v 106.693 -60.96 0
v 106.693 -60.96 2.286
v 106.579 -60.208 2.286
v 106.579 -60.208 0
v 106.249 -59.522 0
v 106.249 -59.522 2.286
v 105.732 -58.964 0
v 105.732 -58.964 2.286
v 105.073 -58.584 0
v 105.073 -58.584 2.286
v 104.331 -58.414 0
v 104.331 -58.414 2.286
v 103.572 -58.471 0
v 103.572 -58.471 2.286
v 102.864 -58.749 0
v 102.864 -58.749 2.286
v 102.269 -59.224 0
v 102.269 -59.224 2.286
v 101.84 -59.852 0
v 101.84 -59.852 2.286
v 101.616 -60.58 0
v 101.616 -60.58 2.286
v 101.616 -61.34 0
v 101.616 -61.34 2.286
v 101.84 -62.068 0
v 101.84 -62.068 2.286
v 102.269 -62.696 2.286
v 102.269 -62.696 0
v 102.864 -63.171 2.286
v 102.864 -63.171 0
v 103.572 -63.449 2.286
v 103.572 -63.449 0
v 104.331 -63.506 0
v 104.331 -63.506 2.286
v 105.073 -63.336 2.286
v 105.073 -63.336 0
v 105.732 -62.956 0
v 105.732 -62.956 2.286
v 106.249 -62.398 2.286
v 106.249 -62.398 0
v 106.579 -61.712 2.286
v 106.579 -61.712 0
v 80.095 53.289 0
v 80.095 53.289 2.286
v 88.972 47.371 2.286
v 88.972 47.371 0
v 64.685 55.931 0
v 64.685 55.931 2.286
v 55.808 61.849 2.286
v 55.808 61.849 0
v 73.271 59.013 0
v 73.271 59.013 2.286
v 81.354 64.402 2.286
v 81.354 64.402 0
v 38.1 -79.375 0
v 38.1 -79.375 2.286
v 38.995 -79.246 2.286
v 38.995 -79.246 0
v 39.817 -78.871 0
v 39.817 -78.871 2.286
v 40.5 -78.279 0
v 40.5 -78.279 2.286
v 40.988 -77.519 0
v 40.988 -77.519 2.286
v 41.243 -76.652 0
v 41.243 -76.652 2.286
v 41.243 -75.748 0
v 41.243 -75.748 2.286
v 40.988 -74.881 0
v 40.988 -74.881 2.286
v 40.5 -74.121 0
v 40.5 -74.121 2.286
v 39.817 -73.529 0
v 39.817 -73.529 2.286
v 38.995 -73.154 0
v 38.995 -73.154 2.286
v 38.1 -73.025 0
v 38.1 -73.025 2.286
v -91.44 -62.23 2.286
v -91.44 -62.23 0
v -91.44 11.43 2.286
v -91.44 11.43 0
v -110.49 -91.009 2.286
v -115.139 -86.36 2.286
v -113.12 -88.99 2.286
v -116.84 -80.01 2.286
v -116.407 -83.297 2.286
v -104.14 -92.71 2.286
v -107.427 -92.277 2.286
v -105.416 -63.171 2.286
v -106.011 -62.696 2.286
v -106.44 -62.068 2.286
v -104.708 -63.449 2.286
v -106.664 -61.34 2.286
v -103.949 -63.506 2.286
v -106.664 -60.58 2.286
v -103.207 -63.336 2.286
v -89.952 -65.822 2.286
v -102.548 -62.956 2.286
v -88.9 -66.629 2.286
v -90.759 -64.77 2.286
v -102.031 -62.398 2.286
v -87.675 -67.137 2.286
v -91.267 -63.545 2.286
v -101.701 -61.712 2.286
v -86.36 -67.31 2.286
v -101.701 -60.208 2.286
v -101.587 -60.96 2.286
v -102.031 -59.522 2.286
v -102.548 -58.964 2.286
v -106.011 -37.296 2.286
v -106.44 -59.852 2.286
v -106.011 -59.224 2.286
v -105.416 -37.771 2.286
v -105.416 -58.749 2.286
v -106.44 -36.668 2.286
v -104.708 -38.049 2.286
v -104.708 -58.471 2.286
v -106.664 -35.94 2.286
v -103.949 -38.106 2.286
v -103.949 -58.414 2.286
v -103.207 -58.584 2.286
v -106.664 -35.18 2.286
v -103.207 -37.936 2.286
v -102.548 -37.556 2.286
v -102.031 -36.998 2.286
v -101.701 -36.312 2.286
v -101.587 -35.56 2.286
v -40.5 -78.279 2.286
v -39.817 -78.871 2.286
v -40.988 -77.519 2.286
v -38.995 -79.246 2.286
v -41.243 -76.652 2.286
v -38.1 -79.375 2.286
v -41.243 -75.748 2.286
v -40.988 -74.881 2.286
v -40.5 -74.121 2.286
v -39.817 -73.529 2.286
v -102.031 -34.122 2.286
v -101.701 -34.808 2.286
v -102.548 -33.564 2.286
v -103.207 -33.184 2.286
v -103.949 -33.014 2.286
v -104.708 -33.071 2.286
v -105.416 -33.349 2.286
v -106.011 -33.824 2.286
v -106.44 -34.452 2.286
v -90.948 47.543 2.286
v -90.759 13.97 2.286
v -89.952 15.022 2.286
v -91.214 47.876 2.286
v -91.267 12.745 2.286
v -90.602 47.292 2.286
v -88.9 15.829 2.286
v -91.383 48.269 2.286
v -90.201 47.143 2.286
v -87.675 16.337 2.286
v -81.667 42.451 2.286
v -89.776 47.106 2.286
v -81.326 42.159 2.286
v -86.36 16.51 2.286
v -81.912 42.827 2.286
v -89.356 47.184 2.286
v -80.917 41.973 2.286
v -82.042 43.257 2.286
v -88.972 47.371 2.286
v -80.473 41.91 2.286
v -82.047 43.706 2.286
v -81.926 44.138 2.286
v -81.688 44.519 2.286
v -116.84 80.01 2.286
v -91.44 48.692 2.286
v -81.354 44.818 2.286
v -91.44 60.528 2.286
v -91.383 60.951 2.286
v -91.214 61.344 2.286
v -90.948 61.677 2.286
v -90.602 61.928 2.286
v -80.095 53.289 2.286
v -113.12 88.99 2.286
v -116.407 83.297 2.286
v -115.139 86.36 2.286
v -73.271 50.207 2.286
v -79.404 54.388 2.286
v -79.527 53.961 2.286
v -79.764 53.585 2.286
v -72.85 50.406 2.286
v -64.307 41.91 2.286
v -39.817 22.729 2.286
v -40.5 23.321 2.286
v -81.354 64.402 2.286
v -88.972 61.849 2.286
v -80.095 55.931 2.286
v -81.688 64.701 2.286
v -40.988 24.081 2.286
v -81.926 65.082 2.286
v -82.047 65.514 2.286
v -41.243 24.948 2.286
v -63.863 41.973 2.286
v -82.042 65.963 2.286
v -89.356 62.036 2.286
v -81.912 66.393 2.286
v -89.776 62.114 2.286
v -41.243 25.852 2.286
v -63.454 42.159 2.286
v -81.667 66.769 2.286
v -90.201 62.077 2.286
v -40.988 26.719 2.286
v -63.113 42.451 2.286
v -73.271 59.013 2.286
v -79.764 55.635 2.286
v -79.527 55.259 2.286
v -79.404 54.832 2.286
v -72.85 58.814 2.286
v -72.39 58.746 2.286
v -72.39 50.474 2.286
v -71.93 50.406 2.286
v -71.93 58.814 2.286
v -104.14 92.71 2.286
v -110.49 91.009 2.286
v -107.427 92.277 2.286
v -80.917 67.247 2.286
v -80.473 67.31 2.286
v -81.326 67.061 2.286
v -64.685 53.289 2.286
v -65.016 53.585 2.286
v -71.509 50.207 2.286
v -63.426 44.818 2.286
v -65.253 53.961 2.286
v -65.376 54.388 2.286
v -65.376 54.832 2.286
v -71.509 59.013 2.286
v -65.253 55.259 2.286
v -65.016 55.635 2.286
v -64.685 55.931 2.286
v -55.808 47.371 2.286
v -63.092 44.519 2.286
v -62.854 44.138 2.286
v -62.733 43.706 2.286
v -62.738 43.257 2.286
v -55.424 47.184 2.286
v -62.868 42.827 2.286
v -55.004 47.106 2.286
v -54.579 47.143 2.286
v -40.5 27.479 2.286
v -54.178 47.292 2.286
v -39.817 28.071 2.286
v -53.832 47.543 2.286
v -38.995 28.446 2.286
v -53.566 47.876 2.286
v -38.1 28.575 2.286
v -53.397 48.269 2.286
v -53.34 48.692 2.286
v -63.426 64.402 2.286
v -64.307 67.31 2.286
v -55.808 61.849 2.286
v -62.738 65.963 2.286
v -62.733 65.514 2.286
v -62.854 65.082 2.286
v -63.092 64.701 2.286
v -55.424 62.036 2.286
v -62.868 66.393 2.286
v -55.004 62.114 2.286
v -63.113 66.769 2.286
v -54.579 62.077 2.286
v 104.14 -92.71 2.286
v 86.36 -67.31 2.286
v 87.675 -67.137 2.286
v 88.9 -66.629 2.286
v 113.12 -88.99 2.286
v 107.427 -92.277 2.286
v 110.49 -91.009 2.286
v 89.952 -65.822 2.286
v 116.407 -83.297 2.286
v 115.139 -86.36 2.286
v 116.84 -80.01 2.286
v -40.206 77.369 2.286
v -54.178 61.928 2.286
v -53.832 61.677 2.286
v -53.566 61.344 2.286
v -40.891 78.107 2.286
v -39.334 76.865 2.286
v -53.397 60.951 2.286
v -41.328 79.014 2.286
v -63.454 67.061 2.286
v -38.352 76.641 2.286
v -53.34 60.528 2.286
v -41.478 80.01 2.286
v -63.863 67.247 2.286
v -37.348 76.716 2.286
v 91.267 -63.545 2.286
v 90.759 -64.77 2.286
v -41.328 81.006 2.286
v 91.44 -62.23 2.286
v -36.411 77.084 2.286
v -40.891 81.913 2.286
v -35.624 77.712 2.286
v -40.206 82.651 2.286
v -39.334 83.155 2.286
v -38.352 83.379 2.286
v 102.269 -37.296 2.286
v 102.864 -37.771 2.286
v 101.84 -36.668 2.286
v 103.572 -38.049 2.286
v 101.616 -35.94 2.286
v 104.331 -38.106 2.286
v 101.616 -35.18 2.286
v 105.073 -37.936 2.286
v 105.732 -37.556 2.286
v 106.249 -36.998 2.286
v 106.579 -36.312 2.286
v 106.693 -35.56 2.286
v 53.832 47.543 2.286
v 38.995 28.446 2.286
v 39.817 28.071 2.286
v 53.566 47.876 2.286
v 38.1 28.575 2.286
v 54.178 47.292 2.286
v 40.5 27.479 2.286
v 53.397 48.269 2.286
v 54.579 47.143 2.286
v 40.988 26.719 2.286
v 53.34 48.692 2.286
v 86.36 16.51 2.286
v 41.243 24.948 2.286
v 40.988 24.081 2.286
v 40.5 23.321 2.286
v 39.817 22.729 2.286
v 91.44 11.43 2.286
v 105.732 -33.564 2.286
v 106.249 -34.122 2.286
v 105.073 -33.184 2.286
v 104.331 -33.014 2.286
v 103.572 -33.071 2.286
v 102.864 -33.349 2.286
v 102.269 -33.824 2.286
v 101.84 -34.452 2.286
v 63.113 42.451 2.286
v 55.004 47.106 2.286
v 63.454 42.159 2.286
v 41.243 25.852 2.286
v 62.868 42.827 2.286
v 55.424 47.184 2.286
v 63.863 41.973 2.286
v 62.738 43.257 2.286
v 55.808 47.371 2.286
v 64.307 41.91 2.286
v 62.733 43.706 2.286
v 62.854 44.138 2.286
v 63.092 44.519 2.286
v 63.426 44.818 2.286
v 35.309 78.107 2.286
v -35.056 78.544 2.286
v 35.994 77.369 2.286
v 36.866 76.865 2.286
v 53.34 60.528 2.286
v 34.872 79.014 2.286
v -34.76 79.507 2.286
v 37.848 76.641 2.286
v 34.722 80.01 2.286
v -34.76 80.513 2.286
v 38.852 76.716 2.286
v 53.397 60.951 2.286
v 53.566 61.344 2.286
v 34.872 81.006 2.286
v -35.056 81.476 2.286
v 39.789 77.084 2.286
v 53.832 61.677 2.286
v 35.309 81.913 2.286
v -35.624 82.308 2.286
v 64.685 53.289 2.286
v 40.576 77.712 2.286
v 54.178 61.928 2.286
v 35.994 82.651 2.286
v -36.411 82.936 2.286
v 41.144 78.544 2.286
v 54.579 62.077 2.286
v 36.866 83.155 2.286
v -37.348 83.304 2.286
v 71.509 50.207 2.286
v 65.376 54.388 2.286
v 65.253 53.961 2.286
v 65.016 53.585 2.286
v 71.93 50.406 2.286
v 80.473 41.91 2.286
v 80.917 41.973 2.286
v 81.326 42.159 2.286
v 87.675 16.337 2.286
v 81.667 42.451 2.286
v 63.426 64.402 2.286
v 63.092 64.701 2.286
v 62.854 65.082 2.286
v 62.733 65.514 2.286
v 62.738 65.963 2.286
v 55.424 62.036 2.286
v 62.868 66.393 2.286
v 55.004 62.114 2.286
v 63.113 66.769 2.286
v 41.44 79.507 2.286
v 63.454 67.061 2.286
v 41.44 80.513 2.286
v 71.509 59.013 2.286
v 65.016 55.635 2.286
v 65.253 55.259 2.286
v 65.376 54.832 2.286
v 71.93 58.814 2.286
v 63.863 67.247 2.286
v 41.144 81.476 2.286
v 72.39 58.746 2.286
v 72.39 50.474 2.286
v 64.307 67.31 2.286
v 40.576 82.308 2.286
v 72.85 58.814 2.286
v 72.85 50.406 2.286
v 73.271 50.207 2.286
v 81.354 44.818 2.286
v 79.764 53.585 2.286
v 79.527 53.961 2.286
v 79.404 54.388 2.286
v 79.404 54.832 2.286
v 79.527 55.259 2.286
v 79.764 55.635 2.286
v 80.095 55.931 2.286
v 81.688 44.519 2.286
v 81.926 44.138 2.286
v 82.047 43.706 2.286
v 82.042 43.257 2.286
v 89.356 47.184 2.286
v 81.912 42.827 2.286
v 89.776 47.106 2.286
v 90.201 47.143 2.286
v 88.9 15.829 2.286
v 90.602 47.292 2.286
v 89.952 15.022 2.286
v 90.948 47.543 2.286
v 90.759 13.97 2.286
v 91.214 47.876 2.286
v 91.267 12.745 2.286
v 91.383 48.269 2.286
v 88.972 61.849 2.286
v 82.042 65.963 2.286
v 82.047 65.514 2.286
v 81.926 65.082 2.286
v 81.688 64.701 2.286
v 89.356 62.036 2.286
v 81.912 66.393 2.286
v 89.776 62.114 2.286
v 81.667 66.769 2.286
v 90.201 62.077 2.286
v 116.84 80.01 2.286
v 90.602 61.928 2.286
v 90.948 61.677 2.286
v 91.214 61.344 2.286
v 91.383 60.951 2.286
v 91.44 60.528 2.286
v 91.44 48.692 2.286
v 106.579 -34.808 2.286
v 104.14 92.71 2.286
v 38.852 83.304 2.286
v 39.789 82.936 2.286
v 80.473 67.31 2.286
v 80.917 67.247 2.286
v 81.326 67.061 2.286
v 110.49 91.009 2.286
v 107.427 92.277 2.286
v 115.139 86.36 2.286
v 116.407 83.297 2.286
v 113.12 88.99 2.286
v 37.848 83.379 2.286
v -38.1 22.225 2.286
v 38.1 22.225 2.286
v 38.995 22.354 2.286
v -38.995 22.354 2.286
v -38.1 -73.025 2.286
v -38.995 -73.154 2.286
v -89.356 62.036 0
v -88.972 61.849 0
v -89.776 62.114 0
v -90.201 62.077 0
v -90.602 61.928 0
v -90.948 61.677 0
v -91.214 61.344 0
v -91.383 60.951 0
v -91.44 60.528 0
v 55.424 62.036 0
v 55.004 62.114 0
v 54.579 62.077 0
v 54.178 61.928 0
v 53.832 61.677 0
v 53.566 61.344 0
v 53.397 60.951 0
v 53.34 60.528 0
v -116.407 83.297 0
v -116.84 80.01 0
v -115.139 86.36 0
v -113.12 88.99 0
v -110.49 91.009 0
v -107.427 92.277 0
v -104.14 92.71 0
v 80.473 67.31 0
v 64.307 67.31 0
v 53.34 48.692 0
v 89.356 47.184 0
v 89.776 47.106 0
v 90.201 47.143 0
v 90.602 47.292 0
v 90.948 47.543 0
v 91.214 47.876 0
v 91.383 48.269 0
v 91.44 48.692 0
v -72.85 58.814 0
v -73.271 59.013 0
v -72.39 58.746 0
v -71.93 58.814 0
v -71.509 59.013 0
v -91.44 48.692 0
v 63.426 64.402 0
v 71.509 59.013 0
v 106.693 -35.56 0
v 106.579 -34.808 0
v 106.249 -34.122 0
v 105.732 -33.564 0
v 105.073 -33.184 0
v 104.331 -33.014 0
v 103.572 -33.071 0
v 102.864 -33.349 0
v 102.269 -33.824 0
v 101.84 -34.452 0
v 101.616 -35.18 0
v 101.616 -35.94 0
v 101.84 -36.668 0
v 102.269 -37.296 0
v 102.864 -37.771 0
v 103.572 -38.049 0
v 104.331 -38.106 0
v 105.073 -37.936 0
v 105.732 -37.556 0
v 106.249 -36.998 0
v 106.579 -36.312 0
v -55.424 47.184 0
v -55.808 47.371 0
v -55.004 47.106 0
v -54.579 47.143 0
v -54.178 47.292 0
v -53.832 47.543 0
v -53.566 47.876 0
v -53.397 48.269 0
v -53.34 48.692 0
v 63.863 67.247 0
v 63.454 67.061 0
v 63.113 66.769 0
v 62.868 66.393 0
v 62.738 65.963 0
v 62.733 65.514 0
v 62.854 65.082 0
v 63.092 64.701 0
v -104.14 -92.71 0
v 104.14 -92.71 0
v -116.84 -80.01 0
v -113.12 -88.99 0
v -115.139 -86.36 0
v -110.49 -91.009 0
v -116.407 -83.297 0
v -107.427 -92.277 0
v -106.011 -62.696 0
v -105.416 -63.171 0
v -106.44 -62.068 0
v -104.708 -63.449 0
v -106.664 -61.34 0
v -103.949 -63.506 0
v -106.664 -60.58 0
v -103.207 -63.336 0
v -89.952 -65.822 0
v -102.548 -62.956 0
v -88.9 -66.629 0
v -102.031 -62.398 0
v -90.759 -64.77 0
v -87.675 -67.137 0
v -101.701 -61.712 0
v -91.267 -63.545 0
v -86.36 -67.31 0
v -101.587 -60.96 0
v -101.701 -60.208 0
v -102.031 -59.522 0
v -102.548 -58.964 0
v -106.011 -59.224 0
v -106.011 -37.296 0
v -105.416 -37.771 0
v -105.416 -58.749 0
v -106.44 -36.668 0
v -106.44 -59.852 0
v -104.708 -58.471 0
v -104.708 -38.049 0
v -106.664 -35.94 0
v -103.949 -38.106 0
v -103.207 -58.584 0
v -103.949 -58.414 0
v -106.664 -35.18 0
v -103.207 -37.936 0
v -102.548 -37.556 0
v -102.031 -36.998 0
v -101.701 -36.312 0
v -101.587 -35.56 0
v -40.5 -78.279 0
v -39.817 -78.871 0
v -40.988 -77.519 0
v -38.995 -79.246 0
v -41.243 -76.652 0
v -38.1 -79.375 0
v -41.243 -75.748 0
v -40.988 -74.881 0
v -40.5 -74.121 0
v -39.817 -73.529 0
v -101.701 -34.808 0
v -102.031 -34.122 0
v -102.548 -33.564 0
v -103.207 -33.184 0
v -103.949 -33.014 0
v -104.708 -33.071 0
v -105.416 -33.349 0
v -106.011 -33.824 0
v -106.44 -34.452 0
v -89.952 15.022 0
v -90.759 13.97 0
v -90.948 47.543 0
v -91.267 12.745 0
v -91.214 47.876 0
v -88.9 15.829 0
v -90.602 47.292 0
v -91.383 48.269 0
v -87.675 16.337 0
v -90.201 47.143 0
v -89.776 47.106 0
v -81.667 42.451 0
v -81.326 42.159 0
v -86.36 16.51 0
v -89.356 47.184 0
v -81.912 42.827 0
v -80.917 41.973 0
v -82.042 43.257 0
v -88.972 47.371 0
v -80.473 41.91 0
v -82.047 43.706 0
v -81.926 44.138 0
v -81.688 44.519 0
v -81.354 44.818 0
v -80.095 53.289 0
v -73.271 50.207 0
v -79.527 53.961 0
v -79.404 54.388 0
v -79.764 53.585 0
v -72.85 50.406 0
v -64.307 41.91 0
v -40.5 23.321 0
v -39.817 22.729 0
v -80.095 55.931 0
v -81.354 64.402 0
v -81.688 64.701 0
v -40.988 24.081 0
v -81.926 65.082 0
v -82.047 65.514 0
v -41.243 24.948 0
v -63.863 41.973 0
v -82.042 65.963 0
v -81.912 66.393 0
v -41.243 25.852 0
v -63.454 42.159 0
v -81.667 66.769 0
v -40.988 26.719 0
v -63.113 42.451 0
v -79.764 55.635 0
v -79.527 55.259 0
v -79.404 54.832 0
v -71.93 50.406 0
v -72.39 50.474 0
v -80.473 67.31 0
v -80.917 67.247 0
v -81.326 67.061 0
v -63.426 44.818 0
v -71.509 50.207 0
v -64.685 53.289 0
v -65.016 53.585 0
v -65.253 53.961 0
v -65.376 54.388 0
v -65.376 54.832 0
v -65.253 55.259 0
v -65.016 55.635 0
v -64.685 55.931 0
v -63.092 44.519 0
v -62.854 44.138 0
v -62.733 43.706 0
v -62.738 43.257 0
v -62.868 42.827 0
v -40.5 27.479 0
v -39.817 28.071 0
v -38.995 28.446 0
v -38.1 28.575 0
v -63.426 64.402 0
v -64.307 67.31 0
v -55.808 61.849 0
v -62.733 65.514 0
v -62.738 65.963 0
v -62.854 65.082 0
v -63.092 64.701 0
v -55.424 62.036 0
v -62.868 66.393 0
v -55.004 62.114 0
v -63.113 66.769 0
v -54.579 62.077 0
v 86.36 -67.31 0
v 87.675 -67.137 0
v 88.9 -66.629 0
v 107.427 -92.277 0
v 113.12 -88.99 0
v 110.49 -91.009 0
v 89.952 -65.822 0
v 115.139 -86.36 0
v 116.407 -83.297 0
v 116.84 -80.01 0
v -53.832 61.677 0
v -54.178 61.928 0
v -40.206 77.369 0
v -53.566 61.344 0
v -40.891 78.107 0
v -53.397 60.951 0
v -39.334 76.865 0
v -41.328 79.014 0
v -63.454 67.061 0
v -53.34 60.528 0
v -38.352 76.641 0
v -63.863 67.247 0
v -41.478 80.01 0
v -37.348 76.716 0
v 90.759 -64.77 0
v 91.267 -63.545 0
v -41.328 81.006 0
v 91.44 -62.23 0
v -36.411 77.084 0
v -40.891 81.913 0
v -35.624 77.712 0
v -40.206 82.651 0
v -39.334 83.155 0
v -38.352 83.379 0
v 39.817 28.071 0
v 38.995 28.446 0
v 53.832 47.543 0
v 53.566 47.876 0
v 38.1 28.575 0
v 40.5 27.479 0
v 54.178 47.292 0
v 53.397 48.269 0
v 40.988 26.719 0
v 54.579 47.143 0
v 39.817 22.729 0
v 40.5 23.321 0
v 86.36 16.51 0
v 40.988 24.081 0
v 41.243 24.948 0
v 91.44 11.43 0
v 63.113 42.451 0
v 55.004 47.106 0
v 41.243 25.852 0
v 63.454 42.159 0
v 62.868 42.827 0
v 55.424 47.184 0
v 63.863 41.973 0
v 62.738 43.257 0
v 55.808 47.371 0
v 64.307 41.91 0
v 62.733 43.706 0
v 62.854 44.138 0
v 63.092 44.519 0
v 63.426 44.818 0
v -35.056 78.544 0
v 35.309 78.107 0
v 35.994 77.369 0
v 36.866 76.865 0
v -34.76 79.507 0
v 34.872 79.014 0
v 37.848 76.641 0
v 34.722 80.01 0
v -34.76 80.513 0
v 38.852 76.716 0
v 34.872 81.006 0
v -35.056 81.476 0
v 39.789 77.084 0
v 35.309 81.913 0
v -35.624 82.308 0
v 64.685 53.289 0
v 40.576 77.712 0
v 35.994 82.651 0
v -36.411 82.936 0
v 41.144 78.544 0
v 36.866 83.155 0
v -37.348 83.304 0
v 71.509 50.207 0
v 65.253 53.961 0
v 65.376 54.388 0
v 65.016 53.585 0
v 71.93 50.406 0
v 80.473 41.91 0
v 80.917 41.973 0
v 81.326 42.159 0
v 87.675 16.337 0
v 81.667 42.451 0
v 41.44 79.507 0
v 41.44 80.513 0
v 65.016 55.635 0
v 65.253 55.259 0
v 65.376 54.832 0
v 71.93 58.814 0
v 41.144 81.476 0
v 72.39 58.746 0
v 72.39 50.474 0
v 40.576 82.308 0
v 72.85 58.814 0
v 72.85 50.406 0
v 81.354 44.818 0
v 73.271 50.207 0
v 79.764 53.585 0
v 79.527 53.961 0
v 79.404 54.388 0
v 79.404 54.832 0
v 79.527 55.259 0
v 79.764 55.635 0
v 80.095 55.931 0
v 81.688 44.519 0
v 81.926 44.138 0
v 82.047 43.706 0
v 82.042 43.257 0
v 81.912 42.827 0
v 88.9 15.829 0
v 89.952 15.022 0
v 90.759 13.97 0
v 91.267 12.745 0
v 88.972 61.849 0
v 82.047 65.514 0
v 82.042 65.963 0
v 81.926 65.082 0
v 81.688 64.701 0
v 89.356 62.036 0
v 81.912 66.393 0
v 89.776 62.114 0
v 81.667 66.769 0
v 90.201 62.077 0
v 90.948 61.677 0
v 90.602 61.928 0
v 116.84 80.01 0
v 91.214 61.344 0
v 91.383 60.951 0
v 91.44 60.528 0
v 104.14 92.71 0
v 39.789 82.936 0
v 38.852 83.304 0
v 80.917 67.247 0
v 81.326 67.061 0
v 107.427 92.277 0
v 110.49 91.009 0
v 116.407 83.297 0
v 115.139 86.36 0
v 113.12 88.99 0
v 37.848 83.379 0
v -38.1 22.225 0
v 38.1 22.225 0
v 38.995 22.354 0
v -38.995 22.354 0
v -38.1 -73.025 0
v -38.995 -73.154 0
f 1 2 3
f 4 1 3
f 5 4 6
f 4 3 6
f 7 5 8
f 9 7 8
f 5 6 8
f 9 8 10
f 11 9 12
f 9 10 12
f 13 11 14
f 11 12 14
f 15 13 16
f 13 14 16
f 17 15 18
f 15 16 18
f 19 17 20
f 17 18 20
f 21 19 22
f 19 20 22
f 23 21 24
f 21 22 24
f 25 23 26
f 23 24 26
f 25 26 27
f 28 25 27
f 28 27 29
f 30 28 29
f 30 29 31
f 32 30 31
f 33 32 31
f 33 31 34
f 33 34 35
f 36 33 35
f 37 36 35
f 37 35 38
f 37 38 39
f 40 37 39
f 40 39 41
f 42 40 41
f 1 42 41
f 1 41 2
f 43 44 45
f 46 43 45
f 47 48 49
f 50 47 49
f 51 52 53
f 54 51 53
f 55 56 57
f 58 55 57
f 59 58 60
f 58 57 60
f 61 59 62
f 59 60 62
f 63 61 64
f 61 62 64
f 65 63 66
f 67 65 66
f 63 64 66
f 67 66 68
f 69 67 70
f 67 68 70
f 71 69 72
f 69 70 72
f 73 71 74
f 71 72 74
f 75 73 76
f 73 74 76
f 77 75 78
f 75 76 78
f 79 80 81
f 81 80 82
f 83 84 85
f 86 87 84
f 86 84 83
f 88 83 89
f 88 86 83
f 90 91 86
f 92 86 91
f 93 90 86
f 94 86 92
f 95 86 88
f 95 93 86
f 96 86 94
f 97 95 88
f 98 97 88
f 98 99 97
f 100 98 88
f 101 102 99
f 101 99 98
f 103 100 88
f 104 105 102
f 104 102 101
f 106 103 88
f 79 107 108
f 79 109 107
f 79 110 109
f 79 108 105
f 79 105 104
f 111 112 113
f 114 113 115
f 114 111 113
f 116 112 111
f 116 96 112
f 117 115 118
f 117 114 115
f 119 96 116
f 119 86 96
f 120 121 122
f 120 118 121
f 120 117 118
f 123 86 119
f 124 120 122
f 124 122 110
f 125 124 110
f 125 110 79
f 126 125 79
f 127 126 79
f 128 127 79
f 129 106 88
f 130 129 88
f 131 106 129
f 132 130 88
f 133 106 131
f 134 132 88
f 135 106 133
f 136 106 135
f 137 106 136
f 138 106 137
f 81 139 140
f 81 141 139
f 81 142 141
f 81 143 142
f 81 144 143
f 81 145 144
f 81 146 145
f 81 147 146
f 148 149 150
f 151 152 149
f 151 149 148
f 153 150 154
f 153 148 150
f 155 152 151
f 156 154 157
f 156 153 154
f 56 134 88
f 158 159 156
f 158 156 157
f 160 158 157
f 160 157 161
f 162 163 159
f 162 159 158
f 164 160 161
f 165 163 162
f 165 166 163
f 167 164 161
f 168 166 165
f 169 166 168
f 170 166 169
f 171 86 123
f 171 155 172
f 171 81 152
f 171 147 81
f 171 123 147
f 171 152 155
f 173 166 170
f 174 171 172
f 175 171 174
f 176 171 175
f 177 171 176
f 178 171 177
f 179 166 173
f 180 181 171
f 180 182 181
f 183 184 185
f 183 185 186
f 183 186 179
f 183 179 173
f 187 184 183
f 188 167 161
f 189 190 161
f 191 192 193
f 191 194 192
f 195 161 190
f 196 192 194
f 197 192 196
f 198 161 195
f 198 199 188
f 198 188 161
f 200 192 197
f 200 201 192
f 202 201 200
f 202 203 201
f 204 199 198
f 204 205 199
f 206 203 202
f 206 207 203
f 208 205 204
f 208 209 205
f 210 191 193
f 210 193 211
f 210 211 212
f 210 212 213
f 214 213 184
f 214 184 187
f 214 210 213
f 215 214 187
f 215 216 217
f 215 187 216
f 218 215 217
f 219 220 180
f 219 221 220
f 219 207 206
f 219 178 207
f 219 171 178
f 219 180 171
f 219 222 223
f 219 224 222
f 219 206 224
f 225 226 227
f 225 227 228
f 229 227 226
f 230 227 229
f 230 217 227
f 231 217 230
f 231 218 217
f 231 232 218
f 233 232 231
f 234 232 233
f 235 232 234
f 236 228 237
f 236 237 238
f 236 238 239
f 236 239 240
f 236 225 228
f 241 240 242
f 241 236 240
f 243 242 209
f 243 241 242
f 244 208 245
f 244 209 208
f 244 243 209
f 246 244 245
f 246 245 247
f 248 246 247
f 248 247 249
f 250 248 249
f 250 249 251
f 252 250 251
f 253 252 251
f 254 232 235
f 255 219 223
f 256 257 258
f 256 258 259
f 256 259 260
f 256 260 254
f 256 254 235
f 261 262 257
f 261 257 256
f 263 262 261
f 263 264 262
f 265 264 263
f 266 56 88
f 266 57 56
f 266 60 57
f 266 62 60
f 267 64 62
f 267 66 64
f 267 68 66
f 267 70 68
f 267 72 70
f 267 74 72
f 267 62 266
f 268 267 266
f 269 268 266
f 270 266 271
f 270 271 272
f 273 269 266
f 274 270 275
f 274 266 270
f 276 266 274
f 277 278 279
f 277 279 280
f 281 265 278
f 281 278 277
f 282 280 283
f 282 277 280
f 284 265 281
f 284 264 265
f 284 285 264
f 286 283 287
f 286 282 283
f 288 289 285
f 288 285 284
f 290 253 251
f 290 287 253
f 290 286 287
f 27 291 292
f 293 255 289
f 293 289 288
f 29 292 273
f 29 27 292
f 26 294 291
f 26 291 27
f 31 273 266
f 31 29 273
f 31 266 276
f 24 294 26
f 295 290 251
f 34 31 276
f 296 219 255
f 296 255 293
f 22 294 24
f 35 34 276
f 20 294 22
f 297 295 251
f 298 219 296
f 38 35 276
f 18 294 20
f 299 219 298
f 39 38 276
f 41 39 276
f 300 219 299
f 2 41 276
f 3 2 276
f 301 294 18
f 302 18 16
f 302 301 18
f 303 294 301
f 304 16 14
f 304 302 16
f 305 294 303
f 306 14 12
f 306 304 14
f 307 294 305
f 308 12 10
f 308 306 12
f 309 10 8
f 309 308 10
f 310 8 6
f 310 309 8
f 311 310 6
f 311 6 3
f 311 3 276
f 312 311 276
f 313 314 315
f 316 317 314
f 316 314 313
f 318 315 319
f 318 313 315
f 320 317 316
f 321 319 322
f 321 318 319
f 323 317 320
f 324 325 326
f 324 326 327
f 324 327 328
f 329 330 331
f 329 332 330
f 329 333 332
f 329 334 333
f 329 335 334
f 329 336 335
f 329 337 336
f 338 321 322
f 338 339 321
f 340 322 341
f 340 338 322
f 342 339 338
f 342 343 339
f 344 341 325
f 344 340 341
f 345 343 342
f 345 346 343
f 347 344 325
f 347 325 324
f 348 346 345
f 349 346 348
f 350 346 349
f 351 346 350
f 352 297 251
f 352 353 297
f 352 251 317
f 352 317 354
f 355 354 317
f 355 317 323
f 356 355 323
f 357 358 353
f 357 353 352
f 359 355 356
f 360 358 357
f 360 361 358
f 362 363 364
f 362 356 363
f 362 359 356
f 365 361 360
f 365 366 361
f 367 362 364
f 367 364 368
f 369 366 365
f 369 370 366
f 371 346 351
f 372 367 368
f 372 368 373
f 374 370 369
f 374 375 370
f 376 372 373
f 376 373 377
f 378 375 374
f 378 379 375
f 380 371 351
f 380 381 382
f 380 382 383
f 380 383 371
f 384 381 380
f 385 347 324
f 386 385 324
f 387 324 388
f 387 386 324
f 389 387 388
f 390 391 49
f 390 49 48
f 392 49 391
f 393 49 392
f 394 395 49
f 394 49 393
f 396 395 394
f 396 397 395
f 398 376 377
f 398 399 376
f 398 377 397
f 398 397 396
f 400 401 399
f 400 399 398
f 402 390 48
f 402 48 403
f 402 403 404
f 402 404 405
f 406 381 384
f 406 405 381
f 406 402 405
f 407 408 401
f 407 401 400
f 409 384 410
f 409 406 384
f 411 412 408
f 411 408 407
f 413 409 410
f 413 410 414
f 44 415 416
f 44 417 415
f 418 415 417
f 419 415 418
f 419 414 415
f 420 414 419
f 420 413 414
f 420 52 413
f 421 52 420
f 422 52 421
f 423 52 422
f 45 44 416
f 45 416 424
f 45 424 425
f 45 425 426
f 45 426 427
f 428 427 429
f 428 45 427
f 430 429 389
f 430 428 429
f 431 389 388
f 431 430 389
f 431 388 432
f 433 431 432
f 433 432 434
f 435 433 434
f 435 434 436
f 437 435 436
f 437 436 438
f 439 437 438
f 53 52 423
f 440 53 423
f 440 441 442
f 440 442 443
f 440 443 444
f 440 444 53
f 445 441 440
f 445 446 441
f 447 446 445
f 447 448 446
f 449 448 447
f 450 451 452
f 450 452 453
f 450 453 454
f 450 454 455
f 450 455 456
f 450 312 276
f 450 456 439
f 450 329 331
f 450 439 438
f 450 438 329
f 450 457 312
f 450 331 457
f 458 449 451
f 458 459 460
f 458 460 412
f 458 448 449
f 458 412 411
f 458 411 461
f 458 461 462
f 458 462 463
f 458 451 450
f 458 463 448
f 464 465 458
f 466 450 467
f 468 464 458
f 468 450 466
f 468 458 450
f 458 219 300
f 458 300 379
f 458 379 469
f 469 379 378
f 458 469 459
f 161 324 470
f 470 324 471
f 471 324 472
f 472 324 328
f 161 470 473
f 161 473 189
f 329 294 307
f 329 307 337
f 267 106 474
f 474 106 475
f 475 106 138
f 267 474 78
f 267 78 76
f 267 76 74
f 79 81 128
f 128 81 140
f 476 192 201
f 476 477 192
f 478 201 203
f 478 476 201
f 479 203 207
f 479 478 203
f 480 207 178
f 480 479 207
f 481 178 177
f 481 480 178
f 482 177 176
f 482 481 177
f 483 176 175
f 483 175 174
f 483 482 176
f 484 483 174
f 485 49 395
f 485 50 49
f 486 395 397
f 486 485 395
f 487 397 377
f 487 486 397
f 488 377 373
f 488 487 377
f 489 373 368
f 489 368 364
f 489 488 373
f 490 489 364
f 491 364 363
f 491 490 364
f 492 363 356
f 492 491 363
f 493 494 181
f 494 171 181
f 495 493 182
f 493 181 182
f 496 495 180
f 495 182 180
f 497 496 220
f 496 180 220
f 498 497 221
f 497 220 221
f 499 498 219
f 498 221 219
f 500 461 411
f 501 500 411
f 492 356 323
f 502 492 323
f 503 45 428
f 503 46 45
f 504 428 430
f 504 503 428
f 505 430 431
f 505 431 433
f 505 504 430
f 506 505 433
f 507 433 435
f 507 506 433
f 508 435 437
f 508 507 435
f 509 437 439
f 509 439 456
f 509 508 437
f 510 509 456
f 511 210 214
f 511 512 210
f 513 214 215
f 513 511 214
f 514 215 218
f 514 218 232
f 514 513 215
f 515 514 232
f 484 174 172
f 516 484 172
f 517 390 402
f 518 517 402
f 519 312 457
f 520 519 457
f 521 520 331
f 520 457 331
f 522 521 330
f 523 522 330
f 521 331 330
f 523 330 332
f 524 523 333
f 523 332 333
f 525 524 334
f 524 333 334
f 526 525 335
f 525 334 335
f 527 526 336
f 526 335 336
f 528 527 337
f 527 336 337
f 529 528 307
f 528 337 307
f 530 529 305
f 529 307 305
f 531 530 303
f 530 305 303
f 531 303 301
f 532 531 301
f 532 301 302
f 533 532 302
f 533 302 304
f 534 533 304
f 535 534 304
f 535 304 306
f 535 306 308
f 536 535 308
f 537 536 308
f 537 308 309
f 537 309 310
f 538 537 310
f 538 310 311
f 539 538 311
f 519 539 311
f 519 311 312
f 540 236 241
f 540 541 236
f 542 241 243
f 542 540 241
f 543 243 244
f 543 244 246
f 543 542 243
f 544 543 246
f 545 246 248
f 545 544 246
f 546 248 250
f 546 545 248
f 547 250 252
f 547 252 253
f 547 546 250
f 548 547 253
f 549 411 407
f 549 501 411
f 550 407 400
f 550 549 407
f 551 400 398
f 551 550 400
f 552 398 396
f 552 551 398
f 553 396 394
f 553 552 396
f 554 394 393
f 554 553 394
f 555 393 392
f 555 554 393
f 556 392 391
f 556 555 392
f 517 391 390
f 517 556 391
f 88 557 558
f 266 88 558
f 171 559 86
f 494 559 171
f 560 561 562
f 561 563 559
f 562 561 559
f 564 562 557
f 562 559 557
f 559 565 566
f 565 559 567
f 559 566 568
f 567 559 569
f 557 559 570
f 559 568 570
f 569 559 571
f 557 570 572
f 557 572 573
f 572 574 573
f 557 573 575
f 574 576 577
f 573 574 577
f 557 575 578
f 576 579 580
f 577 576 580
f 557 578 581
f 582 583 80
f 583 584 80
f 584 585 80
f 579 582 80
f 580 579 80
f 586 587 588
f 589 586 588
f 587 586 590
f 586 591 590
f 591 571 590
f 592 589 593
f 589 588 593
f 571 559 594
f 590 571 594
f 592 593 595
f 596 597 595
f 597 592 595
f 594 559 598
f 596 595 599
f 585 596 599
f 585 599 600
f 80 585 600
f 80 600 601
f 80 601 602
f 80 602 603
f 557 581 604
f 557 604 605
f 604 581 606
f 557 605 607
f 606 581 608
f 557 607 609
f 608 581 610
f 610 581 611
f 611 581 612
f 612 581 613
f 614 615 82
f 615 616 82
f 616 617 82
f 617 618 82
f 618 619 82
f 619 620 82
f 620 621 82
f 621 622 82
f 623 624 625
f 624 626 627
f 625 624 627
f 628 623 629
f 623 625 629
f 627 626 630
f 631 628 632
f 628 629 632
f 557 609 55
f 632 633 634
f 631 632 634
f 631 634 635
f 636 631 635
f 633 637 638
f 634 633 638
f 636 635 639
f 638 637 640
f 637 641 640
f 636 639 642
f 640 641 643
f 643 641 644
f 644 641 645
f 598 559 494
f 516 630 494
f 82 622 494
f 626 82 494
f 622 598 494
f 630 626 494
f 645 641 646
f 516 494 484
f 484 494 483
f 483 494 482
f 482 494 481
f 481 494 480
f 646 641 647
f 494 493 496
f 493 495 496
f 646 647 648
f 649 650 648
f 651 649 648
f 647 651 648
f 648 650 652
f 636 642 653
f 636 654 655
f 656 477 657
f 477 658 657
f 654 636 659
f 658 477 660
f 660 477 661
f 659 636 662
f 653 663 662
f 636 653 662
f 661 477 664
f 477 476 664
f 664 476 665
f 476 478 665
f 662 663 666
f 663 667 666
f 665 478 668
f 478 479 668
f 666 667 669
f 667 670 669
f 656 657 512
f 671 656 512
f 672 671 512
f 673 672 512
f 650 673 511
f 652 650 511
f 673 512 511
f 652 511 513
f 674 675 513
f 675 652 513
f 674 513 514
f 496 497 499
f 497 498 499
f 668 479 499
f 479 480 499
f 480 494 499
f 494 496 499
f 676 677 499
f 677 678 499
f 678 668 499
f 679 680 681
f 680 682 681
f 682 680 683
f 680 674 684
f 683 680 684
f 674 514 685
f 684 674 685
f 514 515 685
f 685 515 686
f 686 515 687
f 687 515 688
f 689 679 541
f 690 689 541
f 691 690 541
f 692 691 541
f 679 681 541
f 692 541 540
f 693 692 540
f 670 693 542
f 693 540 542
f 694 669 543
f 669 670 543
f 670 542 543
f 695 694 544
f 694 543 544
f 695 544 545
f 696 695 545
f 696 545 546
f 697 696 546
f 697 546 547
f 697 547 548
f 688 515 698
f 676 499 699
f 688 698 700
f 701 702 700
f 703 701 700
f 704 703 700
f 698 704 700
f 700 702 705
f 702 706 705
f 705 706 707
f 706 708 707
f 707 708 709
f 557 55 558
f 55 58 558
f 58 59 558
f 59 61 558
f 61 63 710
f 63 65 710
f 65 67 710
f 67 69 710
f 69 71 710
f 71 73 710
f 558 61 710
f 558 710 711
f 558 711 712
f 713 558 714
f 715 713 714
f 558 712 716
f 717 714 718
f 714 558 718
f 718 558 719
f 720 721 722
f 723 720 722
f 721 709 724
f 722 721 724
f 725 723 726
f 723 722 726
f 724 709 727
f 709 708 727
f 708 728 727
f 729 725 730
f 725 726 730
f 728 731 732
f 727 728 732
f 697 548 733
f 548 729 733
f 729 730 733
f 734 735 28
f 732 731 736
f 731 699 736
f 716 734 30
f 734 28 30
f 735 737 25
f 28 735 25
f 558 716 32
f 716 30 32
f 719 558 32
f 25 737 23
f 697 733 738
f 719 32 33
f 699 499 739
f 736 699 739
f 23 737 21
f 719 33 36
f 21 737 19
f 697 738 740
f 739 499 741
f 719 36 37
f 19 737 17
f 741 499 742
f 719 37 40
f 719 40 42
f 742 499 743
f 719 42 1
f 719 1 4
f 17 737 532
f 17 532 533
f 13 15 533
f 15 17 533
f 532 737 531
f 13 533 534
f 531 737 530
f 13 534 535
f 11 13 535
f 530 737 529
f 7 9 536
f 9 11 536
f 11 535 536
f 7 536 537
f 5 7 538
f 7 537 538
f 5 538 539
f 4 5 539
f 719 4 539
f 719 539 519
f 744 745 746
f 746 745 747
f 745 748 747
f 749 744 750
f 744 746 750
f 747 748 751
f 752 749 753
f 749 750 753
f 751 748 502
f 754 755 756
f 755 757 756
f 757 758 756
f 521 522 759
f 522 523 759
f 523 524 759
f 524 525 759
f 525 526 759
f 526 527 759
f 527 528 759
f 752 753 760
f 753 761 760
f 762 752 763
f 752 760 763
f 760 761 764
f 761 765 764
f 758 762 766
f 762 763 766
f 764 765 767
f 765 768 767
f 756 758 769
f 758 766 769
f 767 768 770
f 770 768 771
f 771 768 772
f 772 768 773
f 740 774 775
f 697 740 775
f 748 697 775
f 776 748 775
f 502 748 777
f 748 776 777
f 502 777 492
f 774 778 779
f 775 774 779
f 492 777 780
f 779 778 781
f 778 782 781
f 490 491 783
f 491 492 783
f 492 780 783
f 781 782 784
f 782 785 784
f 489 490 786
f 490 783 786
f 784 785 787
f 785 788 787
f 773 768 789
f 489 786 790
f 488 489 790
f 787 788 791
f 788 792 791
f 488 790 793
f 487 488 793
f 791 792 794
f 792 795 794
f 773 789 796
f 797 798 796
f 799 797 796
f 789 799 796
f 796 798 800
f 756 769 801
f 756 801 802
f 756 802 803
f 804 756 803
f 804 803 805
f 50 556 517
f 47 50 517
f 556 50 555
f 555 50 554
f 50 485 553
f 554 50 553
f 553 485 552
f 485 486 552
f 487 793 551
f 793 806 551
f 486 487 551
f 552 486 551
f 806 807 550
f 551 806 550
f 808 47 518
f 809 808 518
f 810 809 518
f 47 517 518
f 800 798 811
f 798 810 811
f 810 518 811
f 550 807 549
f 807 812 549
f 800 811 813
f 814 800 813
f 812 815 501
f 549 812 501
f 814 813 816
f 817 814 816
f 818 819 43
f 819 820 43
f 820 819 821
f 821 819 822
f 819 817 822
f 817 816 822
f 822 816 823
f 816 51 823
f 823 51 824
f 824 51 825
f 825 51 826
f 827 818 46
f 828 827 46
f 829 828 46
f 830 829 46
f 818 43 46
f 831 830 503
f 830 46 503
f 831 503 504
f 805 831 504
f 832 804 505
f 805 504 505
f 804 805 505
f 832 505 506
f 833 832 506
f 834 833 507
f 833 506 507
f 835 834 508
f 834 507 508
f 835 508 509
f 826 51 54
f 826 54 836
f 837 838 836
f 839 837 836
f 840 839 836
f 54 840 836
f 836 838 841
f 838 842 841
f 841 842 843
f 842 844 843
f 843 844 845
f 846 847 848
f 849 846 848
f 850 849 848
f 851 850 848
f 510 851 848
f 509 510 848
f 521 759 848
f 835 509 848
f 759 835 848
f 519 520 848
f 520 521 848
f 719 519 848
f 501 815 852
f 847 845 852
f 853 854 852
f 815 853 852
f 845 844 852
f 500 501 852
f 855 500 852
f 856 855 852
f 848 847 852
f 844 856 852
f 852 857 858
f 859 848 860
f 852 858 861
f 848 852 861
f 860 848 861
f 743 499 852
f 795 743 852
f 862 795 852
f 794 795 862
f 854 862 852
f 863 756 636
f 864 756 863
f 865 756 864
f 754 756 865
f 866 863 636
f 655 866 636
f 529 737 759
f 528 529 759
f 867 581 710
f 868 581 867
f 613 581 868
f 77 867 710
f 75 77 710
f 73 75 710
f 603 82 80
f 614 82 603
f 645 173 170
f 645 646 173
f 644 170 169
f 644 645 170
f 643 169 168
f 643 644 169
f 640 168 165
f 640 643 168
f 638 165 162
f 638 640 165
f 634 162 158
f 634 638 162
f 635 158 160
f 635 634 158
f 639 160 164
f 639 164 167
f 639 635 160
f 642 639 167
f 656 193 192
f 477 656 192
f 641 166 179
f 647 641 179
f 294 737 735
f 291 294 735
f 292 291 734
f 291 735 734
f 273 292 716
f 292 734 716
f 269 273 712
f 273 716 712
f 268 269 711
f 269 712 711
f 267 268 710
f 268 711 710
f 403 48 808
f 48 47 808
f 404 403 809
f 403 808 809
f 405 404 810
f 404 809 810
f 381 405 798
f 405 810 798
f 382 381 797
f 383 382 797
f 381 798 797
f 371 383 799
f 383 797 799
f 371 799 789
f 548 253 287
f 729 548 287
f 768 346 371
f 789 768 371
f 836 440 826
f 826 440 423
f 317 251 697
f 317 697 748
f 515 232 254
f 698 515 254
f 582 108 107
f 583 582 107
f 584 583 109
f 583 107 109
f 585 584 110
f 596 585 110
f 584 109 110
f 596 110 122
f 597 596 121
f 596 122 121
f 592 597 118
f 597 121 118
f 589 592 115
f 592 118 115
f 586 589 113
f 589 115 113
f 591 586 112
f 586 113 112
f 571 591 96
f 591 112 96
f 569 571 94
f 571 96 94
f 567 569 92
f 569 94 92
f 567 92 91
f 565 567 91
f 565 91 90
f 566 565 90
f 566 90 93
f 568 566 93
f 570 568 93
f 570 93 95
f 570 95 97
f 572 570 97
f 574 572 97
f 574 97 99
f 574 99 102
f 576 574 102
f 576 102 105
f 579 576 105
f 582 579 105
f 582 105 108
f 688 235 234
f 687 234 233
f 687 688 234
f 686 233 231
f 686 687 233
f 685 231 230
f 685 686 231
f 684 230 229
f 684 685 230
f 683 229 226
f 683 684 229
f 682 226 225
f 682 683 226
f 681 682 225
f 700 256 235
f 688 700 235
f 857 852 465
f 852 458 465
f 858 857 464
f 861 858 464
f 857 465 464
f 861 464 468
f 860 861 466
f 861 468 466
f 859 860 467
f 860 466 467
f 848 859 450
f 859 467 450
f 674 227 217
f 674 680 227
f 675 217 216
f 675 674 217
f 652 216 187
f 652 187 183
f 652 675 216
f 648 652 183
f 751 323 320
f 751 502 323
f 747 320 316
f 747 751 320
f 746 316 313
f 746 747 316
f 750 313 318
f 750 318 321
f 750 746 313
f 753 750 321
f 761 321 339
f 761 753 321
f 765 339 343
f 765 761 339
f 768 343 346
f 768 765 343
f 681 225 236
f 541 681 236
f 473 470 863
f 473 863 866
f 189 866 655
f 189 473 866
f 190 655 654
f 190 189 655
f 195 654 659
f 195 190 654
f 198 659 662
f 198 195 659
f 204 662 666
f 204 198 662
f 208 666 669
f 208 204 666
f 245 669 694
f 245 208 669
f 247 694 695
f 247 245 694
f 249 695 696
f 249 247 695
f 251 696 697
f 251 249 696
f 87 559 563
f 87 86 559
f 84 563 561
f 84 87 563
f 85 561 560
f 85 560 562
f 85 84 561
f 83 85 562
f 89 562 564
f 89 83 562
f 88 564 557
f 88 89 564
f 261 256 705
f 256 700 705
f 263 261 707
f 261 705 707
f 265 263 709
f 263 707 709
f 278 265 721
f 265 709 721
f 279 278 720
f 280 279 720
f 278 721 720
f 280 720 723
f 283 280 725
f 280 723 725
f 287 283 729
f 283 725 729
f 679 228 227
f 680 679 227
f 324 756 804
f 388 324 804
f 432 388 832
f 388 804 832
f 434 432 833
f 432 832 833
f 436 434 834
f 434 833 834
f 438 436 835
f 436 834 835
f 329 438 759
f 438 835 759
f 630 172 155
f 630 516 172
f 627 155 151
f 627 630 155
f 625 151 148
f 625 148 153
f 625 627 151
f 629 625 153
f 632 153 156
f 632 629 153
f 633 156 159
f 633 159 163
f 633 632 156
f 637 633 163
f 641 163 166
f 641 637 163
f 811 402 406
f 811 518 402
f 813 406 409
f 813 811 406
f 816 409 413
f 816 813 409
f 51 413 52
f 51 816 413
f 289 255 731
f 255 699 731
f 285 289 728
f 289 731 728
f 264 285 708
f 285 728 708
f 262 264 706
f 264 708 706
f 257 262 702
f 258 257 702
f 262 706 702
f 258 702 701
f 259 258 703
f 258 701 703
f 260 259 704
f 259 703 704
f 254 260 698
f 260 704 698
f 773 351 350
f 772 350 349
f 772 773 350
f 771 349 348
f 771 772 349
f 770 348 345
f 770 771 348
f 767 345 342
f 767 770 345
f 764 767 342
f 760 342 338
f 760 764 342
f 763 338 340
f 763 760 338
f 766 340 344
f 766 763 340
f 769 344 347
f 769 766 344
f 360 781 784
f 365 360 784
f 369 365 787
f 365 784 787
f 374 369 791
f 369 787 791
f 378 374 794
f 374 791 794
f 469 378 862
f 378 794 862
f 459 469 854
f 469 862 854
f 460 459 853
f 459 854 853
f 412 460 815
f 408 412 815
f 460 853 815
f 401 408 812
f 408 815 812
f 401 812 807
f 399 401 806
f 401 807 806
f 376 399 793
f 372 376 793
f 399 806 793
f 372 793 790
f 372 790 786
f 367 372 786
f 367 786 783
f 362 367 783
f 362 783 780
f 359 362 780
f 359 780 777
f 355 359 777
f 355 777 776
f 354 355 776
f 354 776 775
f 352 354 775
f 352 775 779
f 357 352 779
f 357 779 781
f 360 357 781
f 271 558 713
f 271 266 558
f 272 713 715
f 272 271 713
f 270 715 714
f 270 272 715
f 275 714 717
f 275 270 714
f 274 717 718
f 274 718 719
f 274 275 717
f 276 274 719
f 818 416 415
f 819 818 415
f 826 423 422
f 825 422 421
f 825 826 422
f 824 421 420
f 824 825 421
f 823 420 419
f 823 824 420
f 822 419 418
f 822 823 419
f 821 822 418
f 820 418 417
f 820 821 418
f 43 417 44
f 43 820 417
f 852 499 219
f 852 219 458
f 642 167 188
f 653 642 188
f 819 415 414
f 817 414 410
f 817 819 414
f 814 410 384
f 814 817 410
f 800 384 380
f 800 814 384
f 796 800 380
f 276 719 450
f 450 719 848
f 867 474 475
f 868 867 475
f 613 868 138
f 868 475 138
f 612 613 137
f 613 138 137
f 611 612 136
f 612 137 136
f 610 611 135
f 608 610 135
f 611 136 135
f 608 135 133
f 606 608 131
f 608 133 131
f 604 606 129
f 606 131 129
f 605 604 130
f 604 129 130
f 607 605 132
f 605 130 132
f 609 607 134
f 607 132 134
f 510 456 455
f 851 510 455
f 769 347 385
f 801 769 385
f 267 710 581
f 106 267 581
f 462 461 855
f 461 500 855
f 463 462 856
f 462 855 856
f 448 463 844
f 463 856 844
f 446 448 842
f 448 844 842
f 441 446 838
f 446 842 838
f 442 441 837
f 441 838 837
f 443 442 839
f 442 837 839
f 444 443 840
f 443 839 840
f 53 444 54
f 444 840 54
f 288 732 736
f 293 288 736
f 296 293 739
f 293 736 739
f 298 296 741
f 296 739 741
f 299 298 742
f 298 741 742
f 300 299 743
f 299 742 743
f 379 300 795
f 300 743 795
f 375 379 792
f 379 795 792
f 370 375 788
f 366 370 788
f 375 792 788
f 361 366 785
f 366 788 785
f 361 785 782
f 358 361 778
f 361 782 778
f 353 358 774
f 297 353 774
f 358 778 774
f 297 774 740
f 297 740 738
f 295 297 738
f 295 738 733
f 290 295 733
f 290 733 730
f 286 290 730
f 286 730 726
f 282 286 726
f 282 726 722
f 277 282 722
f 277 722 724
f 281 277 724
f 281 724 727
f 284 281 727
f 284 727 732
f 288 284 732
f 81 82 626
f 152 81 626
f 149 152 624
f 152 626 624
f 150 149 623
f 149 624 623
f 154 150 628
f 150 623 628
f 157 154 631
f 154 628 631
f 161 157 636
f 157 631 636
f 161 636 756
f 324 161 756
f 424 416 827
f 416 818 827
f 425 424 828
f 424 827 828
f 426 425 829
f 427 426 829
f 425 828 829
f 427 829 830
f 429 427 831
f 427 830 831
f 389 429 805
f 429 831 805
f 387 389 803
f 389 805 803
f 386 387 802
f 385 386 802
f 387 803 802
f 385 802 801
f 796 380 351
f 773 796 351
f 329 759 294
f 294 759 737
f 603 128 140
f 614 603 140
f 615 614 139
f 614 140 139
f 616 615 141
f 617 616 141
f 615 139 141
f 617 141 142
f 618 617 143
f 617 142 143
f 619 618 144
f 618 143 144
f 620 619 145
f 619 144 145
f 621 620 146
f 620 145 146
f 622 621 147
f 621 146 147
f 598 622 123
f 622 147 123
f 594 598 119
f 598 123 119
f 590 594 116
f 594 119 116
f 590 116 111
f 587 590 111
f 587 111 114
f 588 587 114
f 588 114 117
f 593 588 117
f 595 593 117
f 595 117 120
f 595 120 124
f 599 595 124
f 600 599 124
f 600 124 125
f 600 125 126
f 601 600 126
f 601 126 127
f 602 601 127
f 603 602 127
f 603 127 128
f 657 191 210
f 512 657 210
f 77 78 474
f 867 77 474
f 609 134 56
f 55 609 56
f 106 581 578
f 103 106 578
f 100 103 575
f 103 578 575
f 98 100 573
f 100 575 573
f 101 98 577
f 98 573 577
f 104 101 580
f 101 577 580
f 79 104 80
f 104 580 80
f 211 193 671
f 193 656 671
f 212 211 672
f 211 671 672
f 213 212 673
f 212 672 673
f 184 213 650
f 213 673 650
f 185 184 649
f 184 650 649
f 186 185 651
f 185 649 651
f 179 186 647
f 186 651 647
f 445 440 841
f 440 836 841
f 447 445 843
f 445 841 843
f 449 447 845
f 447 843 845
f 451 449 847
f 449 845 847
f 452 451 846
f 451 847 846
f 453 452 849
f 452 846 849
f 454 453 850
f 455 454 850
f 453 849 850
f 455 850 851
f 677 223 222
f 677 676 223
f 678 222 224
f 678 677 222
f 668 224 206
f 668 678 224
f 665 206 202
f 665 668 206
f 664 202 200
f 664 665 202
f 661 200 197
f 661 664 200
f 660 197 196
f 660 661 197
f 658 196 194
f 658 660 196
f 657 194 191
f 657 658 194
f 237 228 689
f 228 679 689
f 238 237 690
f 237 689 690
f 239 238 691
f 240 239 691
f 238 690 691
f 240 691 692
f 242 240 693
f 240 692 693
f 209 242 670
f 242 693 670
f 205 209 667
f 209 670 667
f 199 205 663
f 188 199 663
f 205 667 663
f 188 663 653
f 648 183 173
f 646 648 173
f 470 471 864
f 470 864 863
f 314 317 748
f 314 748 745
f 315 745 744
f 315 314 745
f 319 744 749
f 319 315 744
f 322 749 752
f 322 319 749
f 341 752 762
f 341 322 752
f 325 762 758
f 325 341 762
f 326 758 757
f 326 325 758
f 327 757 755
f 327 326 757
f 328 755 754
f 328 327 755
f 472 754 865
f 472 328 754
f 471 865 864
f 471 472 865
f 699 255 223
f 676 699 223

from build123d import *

# Parameters (mm, degrees)
SKETCH1_W               = 233.68
SKETCH1_H               = 185.42
BOSS_EXTRUDE1_DEPTH     = 2.286
CUT_EXTRUDE1_DEPTH      = 150.170893595
F_1_4_CLEARANCE_HOLE2_D = 6.7564
FILLET1_R               = 12.7
SKETCH9_R               = 2.5527
CUT_EXTRUDE2_DEPTH      = 150.170893595
CUT_EXTRUDE3_DEPTH      = 150.170893595
FILLET2_R               = 1.5875


with BuildPart() as part:
    # Sketch1 → Boss-Extrude1 (new body)
    with BuildSketch(Plane.XY):
        Rectangle(SKETCH1_W, SKETCH1_H)
        with BuildLine():
            Line((-86.36, 16.51), (86.36, 16.51))
            ThreePointArc((86.36, 16.51), (89.952102448, 15.022102448), (91.44, 11.43))
            Line((91.44, 11.43), (91.44, -62.23))
            ThreePointArc((91.44, -62.23), (89.952102448, -65.822102448), (86.36, -67.31))
            Line((86.36, -67.31), (-86.36, -67.31))
            ThreePointArc((-86.36, -67.31), (-89.952102448, -65.822102448), (-91.44, -62.23))
            Line((-91.44, -62.23), (-91.44, 11.43))
            ThreePointArc((-91.44, 11.43), (-89.952102448, 15.022102448), (-86.36, 16.51))
        make_face(mode=Mode.SUBTRACT)
    extrude(amount=BOSS_EXTRUDE1_DEPTH)

    # Sketch2 → Cut-Extrude1 (cut, through all)
    with BuildSketch(Plane.XY.offset(2.286)):
        with BuildLine():
            Line((38.1, 22.225), (-38.1, 22.225))
            ThreePointArc((-38.1, 22.225), (-41.275, 25.4), (-38.1, 28.575))
            Line((-38.1, 28.575), (38.1, 28.575))
            ThreePointArc((38.1, 28.575), (41.275, 25.4), (38.1, 22.225))
        make_face()
        with BuildLine():
            Line((38.1, -73.025), (-38.1, -73.025))
            ThreePointArc((-38.1, -73.025), (-41.275, -76.2), (-38.1, -79.375))
            Line((-38.1, -79.375), (38.1, -79.375))
            ThreePointArc((38.1, -79.375), (41.275, -76.2), (38.1, -73.025))
        make_face()
    extrude(amount=-CUT_EXTRUDE1_DEPTH, mode=Mode.SUBTRACT)

    # 1/4 Clearance Hole2 (through all)
    with Locations(Plane.XY.offset(2.286)):
        with Locations((-38.1, 80.01), (38.1, 80.01)):
            Hole(F_1_4_CLEARANCE_HOLE2_D / 2)

    # Fillet1
    fillet1_edges = [part.edges().sort_by_distance(p)[0] for p in [
        (116.84, -92.71, 1.143),
        (-116.84, -92.71, 1.143),
        (-116.84, 92.71, 1.143),
        (116.84, 92.71, 1.143),
    ]]
    fillet(fillet1_edges, radius=FILLET1_R)

    # Sketch9 → Cut-Extrude2 (cut, through all)
    with BuildSketch(Plane.XY.offset(2.286)):
        with Locations((-104.14, -60.96)):
            Circle(SKETCH9_R)
        with Locations((104.14, -60.96)):
            Circle(SKETCH9_R)
        with Locations((104.14, -35.56)):
            Circle(SKETCH9_R)
        with Locations((-104.14, -35.56)):
            Circle(SKETCH9_R)
    extrude(amount=-CUT_EXTRUDE2_DEPTH, mode=Mode.SUBTRACT)

    # Sketch10 → Cut-Extrude3 (cut, through all)
    with BuildSketch(Plane.XY.offset(2.286)):
        Polygon((-59.06381265, 67.31), (-85.71618735, 67.31), (-72.39, 58.4258751), align=None)
        Polygon((-78.11381265, 54.61), (-91.44, 63.4941249), (-91.44, 45.7258751), align=None)
        Polygon((-59.06381265, 41.91), (-72.39, 50.7941249), (-85.71618735, 41.91), align=None)
        Polygon((-53.34, 63.4941249), (-66.66618735, 54.61), (-53.34, 45.7258751), align=None)
        Polygon((85.71618735, 41.91), (72.39, 50.7941249), (59.06381265, 41.91), align=None)
        Polygon((66.66618735, 54.61), (53.34, 63.4941249), (53.34, 45.7258751), align=None)
        Polygon((85.71618735, 67.31), (59.06381265, 67.31), (72.39, 58.4258751), align=None)
        Polygon((91.44, 63.4941249), (78.11381265, 54.61), (91.44, 45.7258751), align=None)
    extrude(amount=-CUT_EXTRUDE3_DEPTH, mode=Mode.SUBTRACT)

    # Fillet2
    fillet2_edges = [part.edges().sort_by_distance(p)[0] for p in [
        (-72.39, 58.4258751, 1.143),
        (-85.71618735, 67.31, 1.143),
        (-59.06381265, 67.31, 1.143),
        (-91.44, 45.7258751, 1.143),
        (-91.44, 63.4941249, 1.143),
        (-78.11381265, 54.61, 1.143),
        (-85.71618735, 41.91, 1.143),
        (-72.39, 50.7941249, 1.143),
        (-59.06381265, 41.91, 1.143),
        (-66.66618735, 54.61, 1.143),
        (-53.34, 63.4941249, 1.143),
        (-53.34, 45.7258751, 1.143),
        (72.39, 50.7941249, 1.143),
        (85.71618735, 41.91, 1.143),
        (59.06381265, 41.91, 1.143),
        (53.34, 45.7258751, 1.143),
        (53.34, 63.4941249, 1.143),
        (66.66618735, 54.61, 1.143),
        (59.06381265, 67.31, 1.143),
        (85.71618735, 67.31, 1.143),
        (72.39, 58.4258751, 1.143),
        (78.11381265, 54.61, 1.143),
        (91.44, 63.4941249, 1.143),
        (91.44, 45.7258751, 1.143),
    ]]
    fillet(fillet2_edges, radius=FILLET2_R)


solid = part.part
